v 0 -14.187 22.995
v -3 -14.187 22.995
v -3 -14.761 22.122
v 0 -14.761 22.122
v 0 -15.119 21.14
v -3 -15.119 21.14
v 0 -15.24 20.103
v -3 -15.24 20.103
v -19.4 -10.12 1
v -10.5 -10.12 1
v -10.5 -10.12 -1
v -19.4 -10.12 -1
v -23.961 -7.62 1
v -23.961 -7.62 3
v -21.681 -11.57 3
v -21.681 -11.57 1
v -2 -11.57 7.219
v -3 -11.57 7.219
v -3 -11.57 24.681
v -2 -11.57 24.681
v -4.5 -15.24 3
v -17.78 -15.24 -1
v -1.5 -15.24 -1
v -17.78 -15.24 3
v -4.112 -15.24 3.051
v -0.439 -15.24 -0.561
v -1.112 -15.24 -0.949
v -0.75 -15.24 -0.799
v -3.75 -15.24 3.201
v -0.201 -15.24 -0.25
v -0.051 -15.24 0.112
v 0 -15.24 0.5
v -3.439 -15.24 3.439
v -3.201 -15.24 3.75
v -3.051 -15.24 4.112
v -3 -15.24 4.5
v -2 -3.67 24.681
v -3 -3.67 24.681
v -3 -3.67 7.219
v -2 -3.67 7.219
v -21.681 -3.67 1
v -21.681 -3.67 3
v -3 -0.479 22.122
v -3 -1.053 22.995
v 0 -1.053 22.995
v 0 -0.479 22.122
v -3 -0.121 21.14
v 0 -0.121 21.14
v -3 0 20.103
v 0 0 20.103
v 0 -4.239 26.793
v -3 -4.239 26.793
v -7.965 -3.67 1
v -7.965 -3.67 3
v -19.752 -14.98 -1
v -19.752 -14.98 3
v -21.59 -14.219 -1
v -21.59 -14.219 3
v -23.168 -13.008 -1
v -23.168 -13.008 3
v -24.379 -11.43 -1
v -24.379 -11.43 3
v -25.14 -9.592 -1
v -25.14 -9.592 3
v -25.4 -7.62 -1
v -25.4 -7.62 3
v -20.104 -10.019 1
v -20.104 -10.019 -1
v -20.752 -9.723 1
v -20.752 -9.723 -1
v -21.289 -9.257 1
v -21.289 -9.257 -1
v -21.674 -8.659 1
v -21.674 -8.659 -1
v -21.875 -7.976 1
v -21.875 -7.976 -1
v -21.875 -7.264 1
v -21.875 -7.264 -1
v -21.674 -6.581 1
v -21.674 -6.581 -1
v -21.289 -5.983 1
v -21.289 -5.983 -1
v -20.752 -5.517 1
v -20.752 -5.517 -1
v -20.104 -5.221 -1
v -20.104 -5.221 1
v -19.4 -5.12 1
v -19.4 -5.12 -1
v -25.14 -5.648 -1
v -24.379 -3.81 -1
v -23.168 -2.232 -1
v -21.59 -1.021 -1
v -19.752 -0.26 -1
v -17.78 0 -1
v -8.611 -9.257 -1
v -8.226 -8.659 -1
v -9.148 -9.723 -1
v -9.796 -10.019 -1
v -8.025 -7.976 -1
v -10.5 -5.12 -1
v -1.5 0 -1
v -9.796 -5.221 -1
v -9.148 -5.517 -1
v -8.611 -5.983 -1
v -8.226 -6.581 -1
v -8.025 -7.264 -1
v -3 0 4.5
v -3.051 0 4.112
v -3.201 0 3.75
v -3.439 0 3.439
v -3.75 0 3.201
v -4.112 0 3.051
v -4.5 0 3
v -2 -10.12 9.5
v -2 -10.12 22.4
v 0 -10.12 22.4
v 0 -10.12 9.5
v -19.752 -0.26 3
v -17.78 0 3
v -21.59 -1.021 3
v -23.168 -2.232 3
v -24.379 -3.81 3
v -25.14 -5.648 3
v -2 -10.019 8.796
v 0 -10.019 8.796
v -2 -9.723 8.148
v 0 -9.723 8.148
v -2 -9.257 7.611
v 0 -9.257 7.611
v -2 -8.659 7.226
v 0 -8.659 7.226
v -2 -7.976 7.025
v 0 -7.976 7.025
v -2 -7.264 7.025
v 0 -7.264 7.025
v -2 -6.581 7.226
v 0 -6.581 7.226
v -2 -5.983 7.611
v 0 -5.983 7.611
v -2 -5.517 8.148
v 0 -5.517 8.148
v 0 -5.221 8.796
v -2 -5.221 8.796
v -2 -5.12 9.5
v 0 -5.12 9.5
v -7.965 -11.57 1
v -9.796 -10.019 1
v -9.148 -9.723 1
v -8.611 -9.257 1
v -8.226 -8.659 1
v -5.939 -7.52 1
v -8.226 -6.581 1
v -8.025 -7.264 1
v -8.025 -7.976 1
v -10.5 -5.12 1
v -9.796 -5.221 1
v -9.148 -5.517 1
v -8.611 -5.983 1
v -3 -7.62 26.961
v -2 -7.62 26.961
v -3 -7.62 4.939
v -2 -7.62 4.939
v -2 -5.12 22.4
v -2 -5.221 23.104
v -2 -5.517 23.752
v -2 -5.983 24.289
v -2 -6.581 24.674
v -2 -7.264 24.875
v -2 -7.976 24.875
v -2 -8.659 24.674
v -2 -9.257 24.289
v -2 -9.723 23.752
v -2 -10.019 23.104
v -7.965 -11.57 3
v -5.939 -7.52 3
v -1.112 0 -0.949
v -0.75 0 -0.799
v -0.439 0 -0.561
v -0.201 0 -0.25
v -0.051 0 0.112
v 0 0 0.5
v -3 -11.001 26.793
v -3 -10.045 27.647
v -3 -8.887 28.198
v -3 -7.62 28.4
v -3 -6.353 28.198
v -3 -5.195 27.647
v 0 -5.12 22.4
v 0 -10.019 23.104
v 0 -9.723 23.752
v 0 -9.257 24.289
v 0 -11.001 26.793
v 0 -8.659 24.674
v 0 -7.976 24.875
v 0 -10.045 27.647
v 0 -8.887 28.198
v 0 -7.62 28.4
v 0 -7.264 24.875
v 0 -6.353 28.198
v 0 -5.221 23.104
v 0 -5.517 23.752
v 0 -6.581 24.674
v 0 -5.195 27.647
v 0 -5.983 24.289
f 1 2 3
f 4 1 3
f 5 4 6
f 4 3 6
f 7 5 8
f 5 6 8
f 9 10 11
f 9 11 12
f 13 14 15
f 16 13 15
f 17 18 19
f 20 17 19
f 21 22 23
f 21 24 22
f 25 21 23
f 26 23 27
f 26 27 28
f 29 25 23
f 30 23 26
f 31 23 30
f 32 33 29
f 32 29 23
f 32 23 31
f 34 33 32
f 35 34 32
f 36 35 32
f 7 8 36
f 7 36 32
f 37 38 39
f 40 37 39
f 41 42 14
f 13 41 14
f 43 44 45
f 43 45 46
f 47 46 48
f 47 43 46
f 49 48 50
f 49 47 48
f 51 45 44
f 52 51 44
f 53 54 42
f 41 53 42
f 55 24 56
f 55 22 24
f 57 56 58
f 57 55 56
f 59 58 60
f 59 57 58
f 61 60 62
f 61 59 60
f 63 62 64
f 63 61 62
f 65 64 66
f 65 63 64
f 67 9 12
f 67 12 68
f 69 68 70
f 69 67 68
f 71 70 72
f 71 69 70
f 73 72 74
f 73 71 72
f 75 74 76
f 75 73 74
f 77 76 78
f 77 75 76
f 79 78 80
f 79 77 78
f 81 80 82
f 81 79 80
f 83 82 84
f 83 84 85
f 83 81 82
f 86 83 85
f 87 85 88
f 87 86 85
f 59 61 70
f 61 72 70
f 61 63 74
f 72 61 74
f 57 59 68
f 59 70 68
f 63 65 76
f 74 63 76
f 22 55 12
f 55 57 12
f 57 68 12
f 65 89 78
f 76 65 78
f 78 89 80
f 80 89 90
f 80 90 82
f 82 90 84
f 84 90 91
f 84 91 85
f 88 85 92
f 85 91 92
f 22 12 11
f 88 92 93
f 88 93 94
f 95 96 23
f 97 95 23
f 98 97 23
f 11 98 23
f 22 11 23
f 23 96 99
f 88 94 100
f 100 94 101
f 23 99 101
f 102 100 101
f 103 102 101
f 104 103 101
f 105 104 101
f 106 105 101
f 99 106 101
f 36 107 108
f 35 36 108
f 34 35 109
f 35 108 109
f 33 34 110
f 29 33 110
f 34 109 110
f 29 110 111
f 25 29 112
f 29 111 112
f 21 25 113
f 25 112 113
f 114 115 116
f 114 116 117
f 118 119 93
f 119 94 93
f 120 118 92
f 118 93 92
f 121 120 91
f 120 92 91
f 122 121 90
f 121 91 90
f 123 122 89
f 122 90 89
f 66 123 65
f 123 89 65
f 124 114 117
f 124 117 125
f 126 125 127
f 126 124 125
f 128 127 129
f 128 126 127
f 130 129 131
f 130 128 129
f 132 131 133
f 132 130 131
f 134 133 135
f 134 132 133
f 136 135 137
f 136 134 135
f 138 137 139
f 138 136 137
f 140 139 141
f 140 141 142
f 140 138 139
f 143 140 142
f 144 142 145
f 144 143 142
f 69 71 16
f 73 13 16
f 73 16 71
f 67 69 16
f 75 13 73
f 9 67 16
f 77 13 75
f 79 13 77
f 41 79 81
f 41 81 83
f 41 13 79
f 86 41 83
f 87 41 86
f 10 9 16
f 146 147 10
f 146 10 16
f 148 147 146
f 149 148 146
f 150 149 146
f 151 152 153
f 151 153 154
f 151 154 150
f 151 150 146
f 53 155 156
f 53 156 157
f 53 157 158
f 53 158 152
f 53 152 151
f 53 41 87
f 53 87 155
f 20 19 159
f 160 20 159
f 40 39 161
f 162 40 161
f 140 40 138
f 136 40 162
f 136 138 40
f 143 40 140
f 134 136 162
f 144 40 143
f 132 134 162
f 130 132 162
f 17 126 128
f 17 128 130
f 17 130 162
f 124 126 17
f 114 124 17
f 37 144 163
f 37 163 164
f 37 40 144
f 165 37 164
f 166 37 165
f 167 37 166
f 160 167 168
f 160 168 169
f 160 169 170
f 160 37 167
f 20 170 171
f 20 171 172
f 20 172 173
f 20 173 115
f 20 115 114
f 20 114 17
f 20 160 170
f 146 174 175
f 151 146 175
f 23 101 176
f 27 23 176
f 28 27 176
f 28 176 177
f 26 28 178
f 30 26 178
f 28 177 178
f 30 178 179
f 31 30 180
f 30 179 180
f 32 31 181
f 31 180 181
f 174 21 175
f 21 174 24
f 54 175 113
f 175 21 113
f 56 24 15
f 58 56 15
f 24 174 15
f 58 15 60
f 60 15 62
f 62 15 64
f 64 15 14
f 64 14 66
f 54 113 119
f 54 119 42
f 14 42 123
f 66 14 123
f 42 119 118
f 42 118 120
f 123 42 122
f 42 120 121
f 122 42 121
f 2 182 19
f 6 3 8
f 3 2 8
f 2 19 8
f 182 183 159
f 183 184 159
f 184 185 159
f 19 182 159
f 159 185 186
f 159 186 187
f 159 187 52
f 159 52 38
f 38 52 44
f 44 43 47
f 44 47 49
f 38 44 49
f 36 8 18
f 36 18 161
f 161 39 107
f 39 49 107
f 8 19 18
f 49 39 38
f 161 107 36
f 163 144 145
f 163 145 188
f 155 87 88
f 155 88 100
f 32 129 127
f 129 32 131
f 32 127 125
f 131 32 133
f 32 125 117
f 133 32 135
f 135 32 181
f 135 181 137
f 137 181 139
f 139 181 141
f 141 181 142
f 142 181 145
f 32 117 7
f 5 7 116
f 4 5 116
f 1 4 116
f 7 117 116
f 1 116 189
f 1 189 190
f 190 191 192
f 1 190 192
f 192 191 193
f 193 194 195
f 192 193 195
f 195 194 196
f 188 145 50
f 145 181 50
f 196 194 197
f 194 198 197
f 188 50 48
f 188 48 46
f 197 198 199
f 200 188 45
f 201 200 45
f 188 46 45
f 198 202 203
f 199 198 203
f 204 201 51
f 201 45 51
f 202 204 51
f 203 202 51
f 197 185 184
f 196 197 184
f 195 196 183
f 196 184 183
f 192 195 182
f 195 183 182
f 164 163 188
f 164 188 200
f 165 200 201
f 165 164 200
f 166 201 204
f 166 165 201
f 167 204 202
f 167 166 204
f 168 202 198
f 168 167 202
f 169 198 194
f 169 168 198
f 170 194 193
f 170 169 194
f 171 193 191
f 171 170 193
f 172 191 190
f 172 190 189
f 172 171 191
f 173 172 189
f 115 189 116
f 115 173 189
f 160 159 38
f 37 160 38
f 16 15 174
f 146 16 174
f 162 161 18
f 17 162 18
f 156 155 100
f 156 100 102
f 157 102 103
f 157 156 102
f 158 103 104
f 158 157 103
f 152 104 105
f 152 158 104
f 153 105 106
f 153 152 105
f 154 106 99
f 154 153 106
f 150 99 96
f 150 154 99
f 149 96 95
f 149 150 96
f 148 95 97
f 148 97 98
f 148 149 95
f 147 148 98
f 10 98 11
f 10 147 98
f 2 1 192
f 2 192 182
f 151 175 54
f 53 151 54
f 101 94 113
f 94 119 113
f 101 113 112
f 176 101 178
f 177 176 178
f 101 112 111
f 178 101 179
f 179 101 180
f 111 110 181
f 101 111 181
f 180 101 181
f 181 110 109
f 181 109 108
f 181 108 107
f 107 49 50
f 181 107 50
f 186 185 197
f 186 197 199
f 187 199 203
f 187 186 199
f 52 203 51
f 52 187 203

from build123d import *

# Parameters (mm, degrees)
F1_DEPTH    = 15.24
F3_DEPTH    = 1
F4_DEPTH    = 3
F6_DEPTH    = 2
F7_DEPTH    = 4
F8_SIZE2    = 6.6595190754
F8_SIZE     = 5.588
F9_T1_DEPTH = 11.189330271
F9_T3_DEPTH = 13.4919223085
F10_R       = 7.61999


# Not quite as in the source:
# - a fillet or chamfer that OpenCascade refuses, or shapes differently, is made with other operations: its cross-section is extruded or revolved along the edge and cut away or added
# - a fillet or chamfer is up to 0.001 mm smaller than in the source, because OpenCascade refuses the exact size


with BuildPart() as f1:
    # F0 (on Front) → F1 (new body)
    with BuildSketch(Plane.XZ):
        with BuildLine():
            ThreePointArc((-3, 4.5), (-3.4393398282, 3.4393398282), (-4.5, 3))
            Line((-4.5, 3), (-25.4, 3))
            Line((-25.4, 3), (-25.4, -1))
            Line((-25.4, -1), (-1.5, -1))
            ThreePointArc((-1.5, -1), (-0.4393398282, -0.5606601718), (0, 0.5))
            Line((0, 0.5), (0, 28.4))
            Line((0, 28.4), (-3, 28.4))
            Line((-3, 28.4), (-3, 4.5))
        make_face()
    extrude(amount=F1_DEPTH)

    # F2 (on face) → F3 (cut)
    with BuildSketch(Plane(origin=(-3, 0, 0), x_dir=(0, -1, 0), z_dir=(-1, 0, 0))):
        Polygon((11.57, 20.1194664367), (11.57, 22.4), (11.57, 24.6805335633), (7.62, 26.9610671266), (3.67, 24.6805335633), (3.67, 22.4), (3.67, 20.1194664367), (3.67, 11.7805335633), (3.67, 9.5), (3.67, 7.2194664367), (7.62, 4.9389328734), (11.57, 7.2194664367), (11.57, 9.5), (11.57, 11.7805335633), align=None)
        with BuildLine():
            Line((5.12, 9.5), (5.12, 22.4))
            ThreePointArc((5.12, 22.4), (7.62, 24.9), (10.12, 22.4))
            Line((10.12, 22.4), (10.12, 9.5))
            ThreePointArc((10.12, 9.5), (7.62, 7), (5.12, 9.5))
        make_face(mode=Mode.SUBTRACT)
    extrude(amount=-F3_DEPTH, mode=Mode.SUBTRACT)

    # F4 (cut, through all): a face of the model
    f4_faces = [f1.faces().sort_by_distance(p)[0] for p in [
        (-3, -7.62, 15.95),
    ]]
    extrude(f4_faces, amount=-F4_DEPTH, mode=Mode.SUBTRACT)

    # F5 (on face) → F6 (cut)
    with BuildSketch(Plane.XY.offset(3)):
        Polygon((-21.6805335633, -11.57), (-7.9645335633, -11.57), (-5.938922, -7.52), (-7.9645335633, -3.67), (-21.6805335633, -3.67), (-23.9610671266, -7.62), align=None)
        with BuildLine():
            Line((-10.5, -10.12), (-19.4, -10.12))
            ThreePointArc((-19.4, -10.12), (-21.9, -7.62), (-19.4, -5.12))
            Line((-19.4, -5.12), (-10.5, -5.12))
            ThreePointArc((-10.5, -5.12), (-8, -7.62), (-10.5, -10.12))
        make_face(mode=Mode.SUBTRACT)
    extrude(amount=-F6_DEPTH, mode=Mode.SUBTRACT)

    # F7 (cut, through all): a face of the model
    f7_faces = [f1.faces().sort_by_distance(p)[0] for p in [
        (-14.95, -7.62, 3),
    ]]
    extrude(f7_faces, amount=-F7_DEPTH, mode=Mode.SUBTRACT)

    # F8
    f8_edges = [f1.edges().sort_by_distance(p)[0] for p in [
        (-1.5, -15.24, 28.4),
        (-1.5, 0, 28.4),
    ]]
    f8_side = f1.faces().sort_by_distance((-1.5, -7.62, 28.4))[0]
    chamfer(f8_edges, length=F8_SIZE, length2=F8_SIZE2, reference=f8_side)

    # F9: fillet of radius 4.5 on 4 edges, made by hand

    # F9_s2 → F9_t1 (cut)
    with BuildSketch(Plane.YZ.offset(-7.0946651355)):
        with BuildLine():
            ThreePointArc((-14.187199994, 22.995159114), (-14.9686167935, 21.6417055154), (-15.24, 20.1026148704))
            Line((-15.24, 20.1026148704), (-15.24, 21.7404809246))
            Line((-15.24, 21.7404809246), (-14.187199994, 22.995159114))
        make_face()
        with BuildLine():
            ThreePointArc((-1.052800006, 22.995159114), (-0.2713832065, 21.6417055154), (0, 20.1026148704))
            Line((0, 20.1026148704), (0, 21.7404809246))
            Line((0, 21.7404809246), (-1.052800006, 22.995159114))
        make_face()
    extrude(amount=F9_T1_DEPTH, mode=Mode.SUBTRACT)

    # F9_s4 → F9_t3 (cut)
    with BuildSketch(Plane.YZ.offset(-8.2459611542)):
        with BuildLine():
            ThreePointArc((-7.5536155383, 28.4), (-9.4553977161, 27.9783850417), (-11.0008155323, 26.7925442436))
            Line((-11.0008155323, 26.7925442436), (-9.652, 28.4))
            Line((-9.652, 28.4), (-7.5536155383, 28.4))
        make_face()
        with BuildLine():
            ThreePointArc((-7.6863844617, 28.4), (-5.7846022839, 27.9783850417), (-4.2391844677, 26.7925442436))
            Line((-4.2391844677, 26.7925442436), (-5.588, 28.4))
            Line((-5.588, 28.4), (-7.6863844617, 28.4))
        make_face()
    extrude(amount=F9_T3_DEPTH, mode=Mode.SUBTRACT)

    # F10 (radius 7.62 in the source; OpenCascade refuses exactly that, so slightly less here)
    f10_edges = [f1.edges().sort_by_distance(p)[0] for p in [
        (-25.4, -15.24, 1),
        (-25.4, 0, 1),
    ]]
    fillet(f10_edges, radius=F10_R)


solid = f1.part
